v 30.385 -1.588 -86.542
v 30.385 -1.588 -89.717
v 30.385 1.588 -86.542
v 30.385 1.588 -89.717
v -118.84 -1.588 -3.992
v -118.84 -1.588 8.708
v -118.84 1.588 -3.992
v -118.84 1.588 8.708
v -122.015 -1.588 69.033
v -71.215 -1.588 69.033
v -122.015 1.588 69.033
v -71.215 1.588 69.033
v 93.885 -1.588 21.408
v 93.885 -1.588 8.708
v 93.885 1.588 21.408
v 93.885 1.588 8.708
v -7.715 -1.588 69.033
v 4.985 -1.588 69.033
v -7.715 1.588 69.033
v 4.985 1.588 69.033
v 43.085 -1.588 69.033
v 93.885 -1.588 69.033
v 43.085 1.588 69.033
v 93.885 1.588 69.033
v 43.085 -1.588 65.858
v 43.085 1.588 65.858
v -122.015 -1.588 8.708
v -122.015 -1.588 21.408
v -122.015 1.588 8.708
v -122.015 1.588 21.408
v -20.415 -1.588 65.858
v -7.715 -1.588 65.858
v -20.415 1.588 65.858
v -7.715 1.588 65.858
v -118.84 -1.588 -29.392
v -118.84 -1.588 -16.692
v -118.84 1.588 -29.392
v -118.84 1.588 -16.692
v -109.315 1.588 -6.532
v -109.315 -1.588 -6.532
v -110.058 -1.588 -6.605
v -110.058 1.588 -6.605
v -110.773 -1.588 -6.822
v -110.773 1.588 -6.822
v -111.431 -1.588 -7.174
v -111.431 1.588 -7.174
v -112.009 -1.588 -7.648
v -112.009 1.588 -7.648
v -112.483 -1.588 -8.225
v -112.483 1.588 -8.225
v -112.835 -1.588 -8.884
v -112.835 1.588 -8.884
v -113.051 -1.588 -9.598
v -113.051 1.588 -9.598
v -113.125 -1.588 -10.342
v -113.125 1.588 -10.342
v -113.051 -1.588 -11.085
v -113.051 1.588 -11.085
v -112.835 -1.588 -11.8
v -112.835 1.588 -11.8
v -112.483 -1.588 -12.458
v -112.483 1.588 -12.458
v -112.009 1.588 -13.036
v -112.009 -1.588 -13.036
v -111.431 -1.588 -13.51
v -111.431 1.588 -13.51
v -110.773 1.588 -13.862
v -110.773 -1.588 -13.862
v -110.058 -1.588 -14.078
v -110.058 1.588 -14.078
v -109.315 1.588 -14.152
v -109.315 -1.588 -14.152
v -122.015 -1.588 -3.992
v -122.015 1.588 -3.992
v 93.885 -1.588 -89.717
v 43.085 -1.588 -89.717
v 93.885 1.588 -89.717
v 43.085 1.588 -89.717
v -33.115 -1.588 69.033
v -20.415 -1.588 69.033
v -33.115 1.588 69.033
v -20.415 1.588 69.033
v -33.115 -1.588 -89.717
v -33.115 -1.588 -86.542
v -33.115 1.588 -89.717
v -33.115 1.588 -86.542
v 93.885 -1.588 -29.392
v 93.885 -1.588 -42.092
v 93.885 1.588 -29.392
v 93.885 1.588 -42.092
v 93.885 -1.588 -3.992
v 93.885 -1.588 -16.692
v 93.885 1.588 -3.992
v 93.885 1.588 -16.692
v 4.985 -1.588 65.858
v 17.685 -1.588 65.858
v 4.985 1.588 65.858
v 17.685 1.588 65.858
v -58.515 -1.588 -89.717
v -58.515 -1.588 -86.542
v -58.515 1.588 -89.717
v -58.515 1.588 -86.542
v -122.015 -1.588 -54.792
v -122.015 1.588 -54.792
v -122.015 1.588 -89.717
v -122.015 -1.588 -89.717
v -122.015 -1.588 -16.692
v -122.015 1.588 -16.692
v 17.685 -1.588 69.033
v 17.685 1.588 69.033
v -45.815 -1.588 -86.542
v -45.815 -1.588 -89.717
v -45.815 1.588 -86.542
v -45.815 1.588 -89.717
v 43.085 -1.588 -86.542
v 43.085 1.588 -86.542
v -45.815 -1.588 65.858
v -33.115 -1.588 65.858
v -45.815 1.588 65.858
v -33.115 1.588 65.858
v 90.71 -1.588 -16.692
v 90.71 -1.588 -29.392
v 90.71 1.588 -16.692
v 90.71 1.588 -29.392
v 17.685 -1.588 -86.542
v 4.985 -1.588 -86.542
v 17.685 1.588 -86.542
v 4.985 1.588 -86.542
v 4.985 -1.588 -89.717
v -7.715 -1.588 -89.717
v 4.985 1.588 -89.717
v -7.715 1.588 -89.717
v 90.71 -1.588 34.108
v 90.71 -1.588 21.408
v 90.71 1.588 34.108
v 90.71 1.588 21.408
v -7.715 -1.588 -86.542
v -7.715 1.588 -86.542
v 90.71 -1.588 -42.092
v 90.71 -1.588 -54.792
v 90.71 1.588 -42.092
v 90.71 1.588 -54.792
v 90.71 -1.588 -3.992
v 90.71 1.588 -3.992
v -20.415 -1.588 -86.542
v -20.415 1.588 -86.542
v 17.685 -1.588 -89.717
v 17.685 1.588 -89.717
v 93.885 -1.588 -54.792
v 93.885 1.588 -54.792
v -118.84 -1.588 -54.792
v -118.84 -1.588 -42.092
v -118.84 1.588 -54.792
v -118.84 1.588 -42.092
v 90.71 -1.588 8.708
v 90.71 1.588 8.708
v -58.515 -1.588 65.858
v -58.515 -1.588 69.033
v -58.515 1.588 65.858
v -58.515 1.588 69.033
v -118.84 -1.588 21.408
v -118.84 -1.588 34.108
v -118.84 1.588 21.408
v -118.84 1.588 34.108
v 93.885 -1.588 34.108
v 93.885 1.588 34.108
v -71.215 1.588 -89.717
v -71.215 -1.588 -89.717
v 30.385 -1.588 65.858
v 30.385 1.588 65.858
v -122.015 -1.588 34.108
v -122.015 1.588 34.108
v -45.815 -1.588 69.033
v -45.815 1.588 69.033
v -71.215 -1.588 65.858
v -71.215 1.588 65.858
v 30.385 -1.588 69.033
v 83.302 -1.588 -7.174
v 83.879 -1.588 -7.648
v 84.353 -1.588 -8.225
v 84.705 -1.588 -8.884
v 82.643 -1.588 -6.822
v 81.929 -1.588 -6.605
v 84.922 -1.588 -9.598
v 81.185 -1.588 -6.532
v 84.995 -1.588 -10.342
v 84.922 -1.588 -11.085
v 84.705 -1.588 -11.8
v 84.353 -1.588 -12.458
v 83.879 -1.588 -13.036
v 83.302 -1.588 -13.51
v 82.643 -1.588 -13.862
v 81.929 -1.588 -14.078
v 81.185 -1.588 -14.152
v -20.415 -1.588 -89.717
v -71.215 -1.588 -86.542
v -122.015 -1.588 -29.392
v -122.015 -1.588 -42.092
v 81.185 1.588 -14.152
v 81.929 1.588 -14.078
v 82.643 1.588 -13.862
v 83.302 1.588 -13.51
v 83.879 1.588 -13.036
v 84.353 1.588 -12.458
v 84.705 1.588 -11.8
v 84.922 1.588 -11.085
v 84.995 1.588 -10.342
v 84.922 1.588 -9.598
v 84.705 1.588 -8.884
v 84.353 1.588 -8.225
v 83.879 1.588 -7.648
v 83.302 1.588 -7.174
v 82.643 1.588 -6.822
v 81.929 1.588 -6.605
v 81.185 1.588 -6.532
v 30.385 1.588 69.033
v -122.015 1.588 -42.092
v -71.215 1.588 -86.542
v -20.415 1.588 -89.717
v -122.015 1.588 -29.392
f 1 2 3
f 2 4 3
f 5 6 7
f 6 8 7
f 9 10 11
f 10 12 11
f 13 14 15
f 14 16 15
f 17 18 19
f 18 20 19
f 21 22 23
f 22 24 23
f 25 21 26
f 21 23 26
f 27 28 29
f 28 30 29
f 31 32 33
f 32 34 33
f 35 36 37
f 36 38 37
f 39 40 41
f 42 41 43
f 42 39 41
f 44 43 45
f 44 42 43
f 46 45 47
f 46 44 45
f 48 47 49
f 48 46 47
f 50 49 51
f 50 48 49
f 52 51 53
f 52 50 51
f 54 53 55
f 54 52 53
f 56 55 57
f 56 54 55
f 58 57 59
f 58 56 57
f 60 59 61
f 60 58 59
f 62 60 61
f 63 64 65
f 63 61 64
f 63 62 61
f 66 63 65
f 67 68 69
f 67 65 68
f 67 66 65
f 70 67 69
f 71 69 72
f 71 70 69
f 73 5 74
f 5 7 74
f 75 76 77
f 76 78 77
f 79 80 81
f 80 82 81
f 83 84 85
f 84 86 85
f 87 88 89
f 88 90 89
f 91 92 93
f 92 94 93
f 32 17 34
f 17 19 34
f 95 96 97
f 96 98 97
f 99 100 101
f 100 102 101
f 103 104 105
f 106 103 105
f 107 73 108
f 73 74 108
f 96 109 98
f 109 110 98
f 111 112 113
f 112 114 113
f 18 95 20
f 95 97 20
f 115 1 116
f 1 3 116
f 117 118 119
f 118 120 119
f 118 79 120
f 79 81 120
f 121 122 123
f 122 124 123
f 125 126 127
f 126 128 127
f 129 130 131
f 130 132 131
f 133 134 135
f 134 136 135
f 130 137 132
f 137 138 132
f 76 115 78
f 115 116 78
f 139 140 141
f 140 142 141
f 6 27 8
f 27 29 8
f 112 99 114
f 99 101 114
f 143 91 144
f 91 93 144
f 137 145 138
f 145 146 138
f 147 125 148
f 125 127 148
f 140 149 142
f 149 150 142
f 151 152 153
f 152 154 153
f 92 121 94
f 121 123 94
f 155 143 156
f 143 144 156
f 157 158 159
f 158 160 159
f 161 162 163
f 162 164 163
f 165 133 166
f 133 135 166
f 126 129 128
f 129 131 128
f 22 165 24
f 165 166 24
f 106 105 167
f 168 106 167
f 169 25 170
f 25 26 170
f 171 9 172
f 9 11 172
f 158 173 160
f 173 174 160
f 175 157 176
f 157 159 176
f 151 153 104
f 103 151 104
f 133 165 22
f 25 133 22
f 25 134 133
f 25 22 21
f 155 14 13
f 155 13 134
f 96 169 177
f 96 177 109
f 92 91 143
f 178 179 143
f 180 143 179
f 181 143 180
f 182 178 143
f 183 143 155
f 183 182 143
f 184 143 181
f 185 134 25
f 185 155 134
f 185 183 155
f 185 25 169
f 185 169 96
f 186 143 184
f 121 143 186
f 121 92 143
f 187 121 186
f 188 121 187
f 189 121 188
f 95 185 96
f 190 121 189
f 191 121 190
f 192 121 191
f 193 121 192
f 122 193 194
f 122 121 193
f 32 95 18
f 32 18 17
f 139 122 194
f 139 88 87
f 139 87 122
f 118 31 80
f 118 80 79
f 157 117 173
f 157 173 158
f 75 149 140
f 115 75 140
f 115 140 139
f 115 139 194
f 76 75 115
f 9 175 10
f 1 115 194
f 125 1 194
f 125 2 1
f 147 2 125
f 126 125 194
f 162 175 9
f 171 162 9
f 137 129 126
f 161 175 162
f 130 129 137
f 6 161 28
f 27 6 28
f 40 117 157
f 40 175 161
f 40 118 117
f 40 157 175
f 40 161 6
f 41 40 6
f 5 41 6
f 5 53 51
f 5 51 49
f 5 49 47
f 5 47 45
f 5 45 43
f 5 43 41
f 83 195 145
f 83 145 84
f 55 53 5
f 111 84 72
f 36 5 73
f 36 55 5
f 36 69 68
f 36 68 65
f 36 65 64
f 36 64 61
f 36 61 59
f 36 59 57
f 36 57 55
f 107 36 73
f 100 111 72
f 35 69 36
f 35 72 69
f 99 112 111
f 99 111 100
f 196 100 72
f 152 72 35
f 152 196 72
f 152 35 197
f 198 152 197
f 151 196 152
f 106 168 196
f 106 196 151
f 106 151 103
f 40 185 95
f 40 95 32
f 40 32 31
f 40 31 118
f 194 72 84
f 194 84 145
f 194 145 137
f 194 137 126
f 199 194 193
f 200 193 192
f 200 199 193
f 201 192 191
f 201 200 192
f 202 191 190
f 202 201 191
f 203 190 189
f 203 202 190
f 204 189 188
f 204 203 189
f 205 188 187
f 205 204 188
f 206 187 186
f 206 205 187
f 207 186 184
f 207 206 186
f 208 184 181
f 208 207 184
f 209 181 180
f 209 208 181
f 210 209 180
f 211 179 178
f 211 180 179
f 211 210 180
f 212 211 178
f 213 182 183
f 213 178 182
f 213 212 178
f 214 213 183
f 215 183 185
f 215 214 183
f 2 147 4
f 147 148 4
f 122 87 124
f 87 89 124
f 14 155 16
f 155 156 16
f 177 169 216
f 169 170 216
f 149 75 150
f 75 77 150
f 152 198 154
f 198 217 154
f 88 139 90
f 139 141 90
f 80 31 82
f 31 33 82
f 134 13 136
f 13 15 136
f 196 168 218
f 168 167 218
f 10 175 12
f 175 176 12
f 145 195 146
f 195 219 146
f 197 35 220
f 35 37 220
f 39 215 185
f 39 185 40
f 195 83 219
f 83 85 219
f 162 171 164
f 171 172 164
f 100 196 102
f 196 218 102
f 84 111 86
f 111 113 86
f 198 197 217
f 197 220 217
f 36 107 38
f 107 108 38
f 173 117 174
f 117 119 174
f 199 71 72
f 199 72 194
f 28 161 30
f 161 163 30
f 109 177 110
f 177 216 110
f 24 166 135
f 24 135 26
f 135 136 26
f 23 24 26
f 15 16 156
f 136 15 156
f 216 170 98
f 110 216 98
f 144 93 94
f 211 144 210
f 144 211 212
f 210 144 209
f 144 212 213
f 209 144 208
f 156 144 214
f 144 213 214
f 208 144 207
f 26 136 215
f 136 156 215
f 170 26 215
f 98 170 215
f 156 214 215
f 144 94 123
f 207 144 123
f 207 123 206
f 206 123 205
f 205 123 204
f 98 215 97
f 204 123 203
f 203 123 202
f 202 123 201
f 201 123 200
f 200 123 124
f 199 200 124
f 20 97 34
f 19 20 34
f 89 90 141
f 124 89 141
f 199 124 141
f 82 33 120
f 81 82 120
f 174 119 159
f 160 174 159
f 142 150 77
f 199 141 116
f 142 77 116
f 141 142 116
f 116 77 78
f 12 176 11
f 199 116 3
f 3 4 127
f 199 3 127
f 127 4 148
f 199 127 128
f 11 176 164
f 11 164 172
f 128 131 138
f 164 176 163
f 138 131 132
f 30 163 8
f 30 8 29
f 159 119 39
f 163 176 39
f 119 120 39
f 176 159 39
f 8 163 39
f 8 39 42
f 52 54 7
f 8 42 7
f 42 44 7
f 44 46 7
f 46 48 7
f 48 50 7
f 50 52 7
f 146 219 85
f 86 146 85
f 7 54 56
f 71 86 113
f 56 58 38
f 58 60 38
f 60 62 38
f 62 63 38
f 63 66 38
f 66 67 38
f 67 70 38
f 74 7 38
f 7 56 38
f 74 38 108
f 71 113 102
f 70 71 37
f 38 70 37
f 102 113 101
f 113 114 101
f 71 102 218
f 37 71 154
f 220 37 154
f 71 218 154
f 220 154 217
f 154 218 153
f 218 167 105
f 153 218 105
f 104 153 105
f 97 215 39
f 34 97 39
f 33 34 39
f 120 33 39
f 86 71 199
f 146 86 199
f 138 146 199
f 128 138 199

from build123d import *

# Parameters (mm, degrees)
BOSS_EXTRUDE1_DEPTH = 1.5875
CUT_EXTRUDE1_DEPTH  = 152.481733807


with BuildPart() as part:
    # Sketch1 → Boss-Extrude1 (new, symmetric)
    with BuildSketch(Plane(origin=(0, 0, 0), x_dir=(1, 0, 0), z_dir=(0, 1, 0))):
        Polygon((-122.014602546, 89.716619519), (-71.214602546, 89.716619519), (-71.214602546, 86.541619519), (-58.514602546, 86.541619519), (-58.514602546, 89.716619519), (-45.814602546, 89.716619519), (-45.814602546, 86.541619519), (-33.114602546, 86.541619519), (-33.114602546, 89.716619519), (-20.414602546, 89.716619519), (-20.414602546, 86.541619519), (-7.714602546, 86.541619519), (-7.714602546, 89.716619519), (4.985397454, 89.716619519), (4.985397454, 86.541619519), (17.685397454, 86.541619519), (17.685397454, 89.716619519), (30.385397454, 89.716619519), (30.385397454, 86.541619519), (43.085397454, 86.541619519), (43.085397454, 89.716619519), (93.885397454, 89.716619519), (93.885397454, 54.791619519), (90.710397454, 54.791619519), (90.710397454, 42.091619519), (93.885397454, 42.091619519), (93.885397454, 29.391619519), (90.710397454, 29.391619519), (90.710397454, 16.691619519), (93.885397454, 16.691619519), (93.885397454, 3.991619519), (90.710397454, 3.991619519), (90.710397454, -8.708380481), (93.885397454, -8.708380481), (93.885397454, -21.408380481), (90.710397454, -21.408380481), (90.710397454, -34.108380481), (93.885397454, -34.108380481), (93.885397454, -69.033380481), (43.085397454, -69.033380481), (43.085397454, -65.858380481), (30.385397454, -65.858380481), (30.385397454, -69.033380481), (17.685397454, -69.033380481), (17.685397454, -65.858380481), (4.985397454, -65.858380481), (4.985397454, -69.033380481), (-7.714602546, -69.033380481), (-7.714602546, -65.858380481), (-20.414602546, -65.858380481), (-20.414602546, -69.033380481), (-33.114602546, -69.033380481), (-33.114602546, -65.858380481), (-45.814602546, -65.858380481), (-45.814602546, -69.033380481), (-58.514602546, -69.033380481), (-58.514602546, -65.858380481), (-71.214602546, -65.858380481), (-71.214602546, -69.033380481), (-122.014602546, -69.033380481), (-122.014602546, -34.108380481), (-118.839602546, -34.108380481), (-118.839602546, -21.408380481), (-122.014602546, -21.408380481), (-122.014602546, -8.708380481), (-118.839602546, -8.708380481), (-118.839602546, 3.991619519), (-122.014602546, 3.991619519), (-122.014602546, 16.691619519), (-118.839602546, 16.691619519), (-118.839602546, 29.391619519), (-122.014602546, 29.391619519), (-122.014602546, 42.091619519), (-118.839602546, 42.091619519), (-118.839602546, 54.791619519), (-122.014602546, 54.791619519), align=None)
    extrude(amount=BOSS_EXTRUDE1_DEPTH, both=True)

    # Sketch2 → Cut-Extrude1 (cut, through all)
    with BuildSketch(Plane(origin=(0, 1.5875, 0), x_dir=(1, 0, 0), z_dir=(0, 1, 0))):
        with BuildLine():
            Line((81.185397454, 6.531619519), (-109.314602546, 6.531619519))
            ThreePointArc((-109.314602546, 6.531619519), (-113.124602546, 10.341619519), (-109.314602546, 14.151619519))
            Line((-109.314602546, 14.151619519), (81.185397454, 14.151619519))
            ThreePointArc((81.185397454, 14.151619519), (84.995397454, 10.341619519), (81.185397454, 6.531619519))
        make_face()
    extrude(amount=-CUT_EXTRUDE1_DEPTH, mode=Mode.SUBTRACT)


solid = part.part
